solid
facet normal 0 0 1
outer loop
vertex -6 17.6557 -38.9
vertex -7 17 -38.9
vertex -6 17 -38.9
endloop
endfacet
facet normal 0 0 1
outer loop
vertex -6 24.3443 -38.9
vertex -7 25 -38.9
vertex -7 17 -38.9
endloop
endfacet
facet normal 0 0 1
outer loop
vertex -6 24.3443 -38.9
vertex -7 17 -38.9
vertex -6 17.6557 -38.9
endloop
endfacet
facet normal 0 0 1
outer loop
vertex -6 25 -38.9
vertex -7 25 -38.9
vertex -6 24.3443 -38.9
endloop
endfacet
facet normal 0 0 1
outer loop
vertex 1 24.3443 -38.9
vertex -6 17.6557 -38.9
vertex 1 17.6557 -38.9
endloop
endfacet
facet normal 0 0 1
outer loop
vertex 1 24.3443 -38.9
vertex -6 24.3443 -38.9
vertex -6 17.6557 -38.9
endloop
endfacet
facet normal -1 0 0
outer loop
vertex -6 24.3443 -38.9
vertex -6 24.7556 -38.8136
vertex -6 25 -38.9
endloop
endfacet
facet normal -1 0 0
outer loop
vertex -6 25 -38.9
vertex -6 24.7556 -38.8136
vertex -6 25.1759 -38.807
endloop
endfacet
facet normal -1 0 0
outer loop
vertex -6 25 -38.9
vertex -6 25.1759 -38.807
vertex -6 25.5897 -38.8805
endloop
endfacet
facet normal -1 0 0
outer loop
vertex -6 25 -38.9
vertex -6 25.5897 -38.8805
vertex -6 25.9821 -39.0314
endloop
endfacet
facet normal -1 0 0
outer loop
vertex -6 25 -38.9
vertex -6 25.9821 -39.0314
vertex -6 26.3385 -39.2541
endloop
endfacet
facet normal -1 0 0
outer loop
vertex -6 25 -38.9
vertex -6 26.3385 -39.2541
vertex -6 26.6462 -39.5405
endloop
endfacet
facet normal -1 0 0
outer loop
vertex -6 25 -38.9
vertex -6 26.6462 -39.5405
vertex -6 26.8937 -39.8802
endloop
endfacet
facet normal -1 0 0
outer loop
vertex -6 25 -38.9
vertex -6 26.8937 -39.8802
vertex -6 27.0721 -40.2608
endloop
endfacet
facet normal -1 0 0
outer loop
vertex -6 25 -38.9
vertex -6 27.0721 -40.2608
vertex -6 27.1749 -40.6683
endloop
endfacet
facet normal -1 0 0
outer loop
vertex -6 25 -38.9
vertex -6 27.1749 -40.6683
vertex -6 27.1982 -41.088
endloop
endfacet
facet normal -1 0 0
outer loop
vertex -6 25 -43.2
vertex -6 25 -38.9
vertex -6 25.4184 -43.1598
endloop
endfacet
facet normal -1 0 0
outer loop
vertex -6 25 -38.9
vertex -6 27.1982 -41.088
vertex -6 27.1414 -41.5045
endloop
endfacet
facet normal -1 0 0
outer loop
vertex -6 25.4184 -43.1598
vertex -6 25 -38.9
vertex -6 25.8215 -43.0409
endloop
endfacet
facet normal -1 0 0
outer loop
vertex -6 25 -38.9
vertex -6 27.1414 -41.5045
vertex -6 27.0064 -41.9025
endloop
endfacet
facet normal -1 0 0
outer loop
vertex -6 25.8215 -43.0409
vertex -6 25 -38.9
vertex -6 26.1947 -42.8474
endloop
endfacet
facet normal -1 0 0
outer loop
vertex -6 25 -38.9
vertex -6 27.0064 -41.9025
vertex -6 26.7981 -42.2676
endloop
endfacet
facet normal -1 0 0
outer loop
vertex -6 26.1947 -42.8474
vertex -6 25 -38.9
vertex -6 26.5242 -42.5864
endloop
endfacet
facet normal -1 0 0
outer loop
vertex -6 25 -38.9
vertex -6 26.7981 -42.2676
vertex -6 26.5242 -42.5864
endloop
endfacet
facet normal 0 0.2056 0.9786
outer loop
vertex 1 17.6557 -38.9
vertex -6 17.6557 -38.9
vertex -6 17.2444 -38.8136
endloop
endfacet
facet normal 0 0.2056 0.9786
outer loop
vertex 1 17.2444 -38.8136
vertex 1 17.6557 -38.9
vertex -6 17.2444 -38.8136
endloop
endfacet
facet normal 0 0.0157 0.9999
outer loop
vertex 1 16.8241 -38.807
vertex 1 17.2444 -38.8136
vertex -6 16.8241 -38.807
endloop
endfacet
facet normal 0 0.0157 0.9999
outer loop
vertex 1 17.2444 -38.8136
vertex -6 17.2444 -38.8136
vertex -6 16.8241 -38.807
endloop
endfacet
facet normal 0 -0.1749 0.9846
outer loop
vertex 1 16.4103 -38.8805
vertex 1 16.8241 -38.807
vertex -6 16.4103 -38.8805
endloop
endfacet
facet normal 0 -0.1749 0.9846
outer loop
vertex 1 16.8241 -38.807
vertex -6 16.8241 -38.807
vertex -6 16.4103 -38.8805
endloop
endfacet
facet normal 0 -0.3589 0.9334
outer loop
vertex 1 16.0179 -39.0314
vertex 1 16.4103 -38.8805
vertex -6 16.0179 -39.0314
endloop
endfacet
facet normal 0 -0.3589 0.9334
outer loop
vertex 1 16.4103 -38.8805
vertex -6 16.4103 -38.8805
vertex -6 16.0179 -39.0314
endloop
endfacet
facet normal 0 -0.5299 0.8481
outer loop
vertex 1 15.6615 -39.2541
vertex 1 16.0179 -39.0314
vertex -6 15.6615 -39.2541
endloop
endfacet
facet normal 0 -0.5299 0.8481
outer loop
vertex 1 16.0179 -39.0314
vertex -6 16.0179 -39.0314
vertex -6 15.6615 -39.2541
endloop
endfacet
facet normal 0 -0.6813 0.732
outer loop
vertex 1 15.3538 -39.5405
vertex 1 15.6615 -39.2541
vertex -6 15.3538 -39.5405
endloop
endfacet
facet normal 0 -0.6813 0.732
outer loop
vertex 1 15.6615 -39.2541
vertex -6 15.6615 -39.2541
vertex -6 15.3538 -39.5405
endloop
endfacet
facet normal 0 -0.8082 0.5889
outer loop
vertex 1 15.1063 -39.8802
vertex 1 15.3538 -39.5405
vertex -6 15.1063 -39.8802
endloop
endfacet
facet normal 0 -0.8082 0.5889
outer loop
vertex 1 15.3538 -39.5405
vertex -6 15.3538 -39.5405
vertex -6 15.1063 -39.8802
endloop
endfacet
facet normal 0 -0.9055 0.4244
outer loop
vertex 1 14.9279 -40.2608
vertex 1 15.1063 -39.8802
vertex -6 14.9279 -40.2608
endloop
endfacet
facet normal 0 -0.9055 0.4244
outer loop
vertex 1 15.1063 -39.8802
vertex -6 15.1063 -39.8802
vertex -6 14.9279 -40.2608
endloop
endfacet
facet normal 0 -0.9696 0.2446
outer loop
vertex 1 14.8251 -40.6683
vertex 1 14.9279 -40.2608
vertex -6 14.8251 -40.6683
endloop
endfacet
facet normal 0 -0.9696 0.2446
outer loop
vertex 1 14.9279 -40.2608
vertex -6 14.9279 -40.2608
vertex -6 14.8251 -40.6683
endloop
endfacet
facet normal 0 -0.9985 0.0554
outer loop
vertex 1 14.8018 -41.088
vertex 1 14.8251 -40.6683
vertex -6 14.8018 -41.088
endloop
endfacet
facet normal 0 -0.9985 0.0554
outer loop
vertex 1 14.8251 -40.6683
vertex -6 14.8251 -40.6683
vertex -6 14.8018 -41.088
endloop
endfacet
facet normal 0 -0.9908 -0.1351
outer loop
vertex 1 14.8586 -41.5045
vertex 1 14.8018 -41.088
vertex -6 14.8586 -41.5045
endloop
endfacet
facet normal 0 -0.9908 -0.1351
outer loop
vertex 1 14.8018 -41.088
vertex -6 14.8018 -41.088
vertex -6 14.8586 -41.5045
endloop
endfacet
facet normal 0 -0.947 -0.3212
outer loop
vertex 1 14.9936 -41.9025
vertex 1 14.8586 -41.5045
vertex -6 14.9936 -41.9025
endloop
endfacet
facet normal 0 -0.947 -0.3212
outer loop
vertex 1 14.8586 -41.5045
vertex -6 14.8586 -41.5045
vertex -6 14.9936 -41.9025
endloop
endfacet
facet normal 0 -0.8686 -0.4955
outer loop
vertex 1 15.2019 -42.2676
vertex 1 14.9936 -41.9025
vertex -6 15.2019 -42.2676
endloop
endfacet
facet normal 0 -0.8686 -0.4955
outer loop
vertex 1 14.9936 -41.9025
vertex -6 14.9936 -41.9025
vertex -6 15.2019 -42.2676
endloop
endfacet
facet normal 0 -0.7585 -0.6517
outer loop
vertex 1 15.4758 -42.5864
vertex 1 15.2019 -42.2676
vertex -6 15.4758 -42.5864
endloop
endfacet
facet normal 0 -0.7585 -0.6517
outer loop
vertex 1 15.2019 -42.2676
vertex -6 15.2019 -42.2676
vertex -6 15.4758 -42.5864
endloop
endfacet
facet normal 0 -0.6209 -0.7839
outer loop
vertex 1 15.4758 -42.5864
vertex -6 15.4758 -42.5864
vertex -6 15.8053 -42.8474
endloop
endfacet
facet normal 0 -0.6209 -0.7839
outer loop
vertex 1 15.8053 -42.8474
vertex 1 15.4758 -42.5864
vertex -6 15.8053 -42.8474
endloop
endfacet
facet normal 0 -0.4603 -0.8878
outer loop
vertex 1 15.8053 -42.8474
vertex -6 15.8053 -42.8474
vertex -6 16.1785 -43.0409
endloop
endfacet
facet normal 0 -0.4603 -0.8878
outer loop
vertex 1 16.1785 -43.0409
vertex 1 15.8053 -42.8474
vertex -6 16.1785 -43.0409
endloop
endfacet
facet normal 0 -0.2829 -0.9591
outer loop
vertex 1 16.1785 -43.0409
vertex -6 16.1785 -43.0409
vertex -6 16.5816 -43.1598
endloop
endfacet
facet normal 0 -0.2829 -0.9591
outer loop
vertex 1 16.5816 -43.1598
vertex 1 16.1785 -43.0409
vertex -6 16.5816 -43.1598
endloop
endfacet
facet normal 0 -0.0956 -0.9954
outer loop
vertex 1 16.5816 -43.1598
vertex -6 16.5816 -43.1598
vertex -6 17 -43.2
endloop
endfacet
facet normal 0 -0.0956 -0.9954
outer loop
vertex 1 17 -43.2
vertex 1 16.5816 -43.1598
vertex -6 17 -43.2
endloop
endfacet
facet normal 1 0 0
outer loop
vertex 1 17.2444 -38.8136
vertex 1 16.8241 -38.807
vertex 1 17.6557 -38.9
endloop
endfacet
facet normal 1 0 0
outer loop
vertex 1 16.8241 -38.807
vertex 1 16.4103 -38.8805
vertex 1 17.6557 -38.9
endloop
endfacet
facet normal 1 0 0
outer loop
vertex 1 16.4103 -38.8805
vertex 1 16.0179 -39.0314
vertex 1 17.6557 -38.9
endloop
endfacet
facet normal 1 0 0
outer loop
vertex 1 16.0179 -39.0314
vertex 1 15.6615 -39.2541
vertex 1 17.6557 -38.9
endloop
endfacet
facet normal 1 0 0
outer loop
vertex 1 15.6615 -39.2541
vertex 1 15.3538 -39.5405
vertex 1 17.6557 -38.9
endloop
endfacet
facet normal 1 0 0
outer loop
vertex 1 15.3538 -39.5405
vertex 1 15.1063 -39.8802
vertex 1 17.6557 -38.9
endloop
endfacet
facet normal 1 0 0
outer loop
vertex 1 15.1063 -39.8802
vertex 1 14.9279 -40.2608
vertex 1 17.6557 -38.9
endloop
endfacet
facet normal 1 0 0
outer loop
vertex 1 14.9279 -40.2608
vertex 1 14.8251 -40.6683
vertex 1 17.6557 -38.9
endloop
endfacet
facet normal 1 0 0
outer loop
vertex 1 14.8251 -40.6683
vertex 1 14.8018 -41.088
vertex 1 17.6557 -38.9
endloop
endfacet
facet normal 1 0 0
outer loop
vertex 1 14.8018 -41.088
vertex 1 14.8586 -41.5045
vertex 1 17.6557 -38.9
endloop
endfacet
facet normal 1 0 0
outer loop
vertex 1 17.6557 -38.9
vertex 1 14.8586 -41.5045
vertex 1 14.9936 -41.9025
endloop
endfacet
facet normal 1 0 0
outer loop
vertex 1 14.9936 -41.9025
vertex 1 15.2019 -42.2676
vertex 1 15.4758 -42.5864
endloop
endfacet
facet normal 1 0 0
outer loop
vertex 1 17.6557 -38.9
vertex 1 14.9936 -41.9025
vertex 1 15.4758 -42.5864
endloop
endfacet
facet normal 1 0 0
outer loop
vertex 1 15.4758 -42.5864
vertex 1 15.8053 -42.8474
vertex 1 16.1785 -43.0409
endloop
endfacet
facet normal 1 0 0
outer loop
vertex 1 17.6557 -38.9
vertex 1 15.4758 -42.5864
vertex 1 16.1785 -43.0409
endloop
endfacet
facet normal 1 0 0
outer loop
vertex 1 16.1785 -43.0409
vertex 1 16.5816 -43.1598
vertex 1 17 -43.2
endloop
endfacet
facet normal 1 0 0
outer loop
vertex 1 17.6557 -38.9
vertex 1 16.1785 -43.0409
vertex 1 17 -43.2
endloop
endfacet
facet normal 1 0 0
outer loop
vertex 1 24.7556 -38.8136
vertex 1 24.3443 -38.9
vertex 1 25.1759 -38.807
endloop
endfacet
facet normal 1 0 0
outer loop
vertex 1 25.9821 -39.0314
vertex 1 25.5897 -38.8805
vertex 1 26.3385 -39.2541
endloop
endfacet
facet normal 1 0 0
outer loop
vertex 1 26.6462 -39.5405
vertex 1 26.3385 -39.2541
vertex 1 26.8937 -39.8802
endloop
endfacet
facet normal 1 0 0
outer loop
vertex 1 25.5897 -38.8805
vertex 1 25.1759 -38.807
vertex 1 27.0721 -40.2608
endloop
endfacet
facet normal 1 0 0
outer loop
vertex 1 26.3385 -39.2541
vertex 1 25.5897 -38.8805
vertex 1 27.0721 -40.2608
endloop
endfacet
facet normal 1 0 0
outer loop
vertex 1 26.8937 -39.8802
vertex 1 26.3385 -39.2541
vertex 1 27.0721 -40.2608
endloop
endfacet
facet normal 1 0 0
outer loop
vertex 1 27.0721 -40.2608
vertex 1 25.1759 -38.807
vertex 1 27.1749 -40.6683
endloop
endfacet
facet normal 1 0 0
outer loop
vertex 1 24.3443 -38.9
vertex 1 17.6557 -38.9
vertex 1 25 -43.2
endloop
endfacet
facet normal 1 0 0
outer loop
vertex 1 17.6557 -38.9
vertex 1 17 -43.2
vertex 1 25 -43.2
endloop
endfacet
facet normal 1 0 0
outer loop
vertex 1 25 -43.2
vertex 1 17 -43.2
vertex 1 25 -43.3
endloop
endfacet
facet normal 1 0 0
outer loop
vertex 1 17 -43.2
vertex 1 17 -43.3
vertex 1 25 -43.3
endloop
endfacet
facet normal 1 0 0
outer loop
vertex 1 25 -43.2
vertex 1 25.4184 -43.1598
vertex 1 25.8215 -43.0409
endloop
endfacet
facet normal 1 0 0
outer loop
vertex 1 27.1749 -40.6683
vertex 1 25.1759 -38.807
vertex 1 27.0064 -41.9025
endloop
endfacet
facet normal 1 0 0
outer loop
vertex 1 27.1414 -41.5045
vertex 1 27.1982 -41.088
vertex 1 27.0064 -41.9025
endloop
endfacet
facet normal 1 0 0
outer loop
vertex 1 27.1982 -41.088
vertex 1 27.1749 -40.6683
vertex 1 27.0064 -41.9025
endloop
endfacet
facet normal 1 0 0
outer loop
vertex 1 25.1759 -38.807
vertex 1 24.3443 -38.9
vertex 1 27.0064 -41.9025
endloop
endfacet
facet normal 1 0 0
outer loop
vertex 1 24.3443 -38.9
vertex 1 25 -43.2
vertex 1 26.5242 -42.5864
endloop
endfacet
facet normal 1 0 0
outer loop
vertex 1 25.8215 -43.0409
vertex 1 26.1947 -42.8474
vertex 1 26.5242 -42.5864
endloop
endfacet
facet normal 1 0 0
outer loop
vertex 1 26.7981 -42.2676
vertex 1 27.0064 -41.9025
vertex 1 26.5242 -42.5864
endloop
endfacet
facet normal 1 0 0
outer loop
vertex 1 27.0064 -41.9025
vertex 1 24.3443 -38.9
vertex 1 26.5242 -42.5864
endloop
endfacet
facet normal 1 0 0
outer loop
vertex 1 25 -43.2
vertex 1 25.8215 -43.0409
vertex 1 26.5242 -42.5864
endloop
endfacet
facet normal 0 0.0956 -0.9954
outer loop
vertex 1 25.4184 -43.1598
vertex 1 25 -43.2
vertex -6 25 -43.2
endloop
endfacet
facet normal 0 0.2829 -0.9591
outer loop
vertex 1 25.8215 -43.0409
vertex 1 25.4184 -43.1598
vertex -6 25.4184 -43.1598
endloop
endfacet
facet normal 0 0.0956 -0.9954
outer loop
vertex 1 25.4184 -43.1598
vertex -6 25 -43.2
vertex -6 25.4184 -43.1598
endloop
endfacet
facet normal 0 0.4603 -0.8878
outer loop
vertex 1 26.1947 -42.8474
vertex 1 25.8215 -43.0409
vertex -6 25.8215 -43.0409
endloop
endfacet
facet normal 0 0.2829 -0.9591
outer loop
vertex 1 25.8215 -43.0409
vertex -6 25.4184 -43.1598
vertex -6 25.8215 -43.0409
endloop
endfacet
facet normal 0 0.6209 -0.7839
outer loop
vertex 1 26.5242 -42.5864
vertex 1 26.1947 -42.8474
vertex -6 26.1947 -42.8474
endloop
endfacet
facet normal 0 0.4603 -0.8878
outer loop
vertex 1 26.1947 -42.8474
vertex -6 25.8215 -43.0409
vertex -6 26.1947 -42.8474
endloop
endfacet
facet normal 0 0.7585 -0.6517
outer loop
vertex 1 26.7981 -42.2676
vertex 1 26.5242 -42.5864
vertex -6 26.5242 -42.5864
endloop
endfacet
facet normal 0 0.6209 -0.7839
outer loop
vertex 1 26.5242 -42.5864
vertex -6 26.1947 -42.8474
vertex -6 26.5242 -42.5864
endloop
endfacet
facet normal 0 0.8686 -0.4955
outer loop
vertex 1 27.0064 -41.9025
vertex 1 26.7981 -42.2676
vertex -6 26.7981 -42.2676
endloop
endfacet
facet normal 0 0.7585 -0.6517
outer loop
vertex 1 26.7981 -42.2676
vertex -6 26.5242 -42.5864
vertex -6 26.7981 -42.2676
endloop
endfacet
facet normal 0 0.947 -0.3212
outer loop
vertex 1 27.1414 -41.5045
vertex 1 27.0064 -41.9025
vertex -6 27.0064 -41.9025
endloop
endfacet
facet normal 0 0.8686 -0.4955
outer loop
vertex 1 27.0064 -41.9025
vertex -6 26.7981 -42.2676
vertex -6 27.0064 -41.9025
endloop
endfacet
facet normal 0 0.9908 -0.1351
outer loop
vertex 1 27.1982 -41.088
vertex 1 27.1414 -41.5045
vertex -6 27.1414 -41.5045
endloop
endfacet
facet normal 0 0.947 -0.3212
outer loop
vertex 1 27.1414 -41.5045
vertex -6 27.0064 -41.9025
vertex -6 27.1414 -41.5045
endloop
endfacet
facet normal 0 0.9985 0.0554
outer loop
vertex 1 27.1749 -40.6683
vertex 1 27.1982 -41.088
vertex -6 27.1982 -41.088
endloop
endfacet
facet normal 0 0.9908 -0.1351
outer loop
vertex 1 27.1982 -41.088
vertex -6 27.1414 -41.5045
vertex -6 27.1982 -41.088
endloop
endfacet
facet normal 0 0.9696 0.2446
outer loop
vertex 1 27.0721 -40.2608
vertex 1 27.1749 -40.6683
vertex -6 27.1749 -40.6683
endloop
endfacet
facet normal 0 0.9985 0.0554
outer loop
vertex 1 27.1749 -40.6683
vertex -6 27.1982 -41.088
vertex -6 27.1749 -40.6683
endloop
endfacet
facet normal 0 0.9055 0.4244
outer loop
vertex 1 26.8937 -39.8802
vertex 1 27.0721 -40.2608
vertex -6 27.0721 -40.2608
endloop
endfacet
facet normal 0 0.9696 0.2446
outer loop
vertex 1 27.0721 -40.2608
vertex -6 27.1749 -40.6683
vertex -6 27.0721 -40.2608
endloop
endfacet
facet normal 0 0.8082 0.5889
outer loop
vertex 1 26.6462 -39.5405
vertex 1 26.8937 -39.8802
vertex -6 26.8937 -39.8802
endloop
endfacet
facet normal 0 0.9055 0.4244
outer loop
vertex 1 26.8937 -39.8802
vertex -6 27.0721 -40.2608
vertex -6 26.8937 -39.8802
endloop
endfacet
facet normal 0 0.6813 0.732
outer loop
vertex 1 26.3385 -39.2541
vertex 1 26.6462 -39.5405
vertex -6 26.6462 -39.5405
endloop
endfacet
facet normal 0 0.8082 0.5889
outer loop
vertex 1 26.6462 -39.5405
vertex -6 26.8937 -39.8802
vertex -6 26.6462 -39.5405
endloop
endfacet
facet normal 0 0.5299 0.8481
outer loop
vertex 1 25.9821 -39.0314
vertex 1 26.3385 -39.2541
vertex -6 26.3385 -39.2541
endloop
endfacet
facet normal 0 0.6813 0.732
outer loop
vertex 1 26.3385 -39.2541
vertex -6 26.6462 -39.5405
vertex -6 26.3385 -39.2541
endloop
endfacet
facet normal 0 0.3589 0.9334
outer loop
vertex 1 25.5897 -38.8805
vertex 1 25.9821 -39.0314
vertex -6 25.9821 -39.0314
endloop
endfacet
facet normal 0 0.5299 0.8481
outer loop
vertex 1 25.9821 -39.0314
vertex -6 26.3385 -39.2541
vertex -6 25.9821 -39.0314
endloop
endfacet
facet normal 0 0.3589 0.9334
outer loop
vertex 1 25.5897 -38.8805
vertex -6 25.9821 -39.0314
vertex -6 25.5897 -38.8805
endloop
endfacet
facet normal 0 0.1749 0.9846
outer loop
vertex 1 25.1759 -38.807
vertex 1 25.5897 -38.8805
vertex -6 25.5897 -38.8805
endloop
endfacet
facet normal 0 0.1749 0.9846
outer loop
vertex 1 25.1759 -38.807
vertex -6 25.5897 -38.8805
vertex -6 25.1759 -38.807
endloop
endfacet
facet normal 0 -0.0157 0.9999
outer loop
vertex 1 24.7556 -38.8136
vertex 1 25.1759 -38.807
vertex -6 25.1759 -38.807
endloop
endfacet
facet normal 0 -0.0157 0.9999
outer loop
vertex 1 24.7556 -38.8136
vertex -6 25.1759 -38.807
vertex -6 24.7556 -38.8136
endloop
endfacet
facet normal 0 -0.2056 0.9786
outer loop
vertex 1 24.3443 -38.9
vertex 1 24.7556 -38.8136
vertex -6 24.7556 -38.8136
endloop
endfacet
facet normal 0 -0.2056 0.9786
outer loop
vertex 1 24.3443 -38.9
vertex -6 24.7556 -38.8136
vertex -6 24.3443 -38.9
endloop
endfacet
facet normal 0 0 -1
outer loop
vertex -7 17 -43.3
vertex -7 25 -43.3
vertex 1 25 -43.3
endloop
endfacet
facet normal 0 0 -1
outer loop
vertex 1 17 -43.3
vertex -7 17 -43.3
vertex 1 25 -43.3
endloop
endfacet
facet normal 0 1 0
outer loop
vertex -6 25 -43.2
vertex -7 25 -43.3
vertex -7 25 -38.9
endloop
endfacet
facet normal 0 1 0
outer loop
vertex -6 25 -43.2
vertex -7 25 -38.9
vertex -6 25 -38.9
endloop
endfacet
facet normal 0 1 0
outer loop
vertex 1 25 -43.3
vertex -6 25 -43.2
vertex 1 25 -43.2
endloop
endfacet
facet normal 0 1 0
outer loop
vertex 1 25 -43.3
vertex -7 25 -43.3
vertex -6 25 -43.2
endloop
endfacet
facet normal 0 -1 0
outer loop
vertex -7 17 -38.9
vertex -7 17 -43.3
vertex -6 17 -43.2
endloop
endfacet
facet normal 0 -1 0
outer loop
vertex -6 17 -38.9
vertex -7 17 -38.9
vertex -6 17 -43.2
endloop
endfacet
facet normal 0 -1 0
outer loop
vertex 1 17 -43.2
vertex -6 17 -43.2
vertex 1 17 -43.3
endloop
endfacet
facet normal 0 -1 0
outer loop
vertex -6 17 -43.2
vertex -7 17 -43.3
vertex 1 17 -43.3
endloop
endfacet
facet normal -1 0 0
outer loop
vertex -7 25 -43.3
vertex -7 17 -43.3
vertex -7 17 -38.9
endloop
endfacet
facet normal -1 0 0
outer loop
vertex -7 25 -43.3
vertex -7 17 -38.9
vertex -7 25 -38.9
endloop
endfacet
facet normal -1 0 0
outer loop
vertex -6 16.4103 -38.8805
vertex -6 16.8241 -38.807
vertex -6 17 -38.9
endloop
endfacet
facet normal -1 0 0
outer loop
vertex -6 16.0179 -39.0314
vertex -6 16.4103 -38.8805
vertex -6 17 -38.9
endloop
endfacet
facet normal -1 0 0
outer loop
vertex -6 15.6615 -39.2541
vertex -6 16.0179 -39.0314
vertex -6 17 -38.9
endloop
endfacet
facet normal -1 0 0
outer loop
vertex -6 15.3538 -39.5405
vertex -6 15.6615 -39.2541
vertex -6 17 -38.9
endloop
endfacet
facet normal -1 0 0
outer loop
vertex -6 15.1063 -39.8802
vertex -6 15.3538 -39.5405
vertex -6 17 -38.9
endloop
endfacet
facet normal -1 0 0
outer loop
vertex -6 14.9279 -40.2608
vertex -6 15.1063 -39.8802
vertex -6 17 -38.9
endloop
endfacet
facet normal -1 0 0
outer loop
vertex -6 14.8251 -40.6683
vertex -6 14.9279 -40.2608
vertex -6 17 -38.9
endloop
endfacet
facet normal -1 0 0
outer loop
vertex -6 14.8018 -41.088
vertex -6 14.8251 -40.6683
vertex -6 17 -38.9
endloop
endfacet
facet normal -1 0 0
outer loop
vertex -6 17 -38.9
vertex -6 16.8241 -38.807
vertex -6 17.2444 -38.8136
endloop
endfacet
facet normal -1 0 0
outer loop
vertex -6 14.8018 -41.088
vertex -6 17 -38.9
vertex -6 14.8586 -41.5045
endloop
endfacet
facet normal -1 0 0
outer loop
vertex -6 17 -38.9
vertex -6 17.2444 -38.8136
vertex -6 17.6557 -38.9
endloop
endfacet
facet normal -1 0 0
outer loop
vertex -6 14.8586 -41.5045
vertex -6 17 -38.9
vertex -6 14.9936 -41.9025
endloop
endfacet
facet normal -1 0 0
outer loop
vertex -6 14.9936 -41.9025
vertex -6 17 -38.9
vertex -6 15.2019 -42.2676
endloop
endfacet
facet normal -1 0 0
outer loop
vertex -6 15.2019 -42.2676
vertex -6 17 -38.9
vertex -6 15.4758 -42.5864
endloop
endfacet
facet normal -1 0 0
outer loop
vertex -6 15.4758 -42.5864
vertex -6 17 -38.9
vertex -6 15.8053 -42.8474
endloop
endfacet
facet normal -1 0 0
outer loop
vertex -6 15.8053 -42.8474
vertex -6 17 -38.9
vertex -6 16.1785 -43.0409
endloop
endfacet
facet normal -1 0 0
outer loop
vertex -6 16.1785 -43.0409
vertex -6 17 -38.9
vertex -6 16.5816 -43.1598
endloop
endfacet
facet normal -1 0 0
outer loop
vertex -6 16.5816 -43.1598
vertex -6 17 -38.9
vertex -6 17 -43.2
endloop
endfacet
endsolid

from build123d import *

# Parameters (mm, degrees)
CYLINDER_R              = 2.2
CYLINDER_DEPTH          = 7
CYLINDER_PITCH_ANGLE    = 90
BOX_W                   = 8
BOX_H                   = 8
BOX_DEPTH               = 4.4
CYLINDER001_R           = 2.2
CYLINDER001_DEPTH       = 7
CYLINDER001_PITCH_ANGLE = 90


with BuildPart() as v_lec:
    # Cylinder → Cylinder (new body)
    with BuildSketch(Plane.XY):
        Circle(CYLINDER_R)
    extrude(amount=CYLINDER_DEPTH)


with BuildPart() as v_lec_1:
    # Cylinder pitch: moved
    add(v_lec.part.rotate(Axis((0, 0, 0), (0, 1, 0)), CYLINDER_PITCH_ANGLE))


with BuildPart() as v_lec_2:
    # Cylinder placement: moved
    add(v_lec_1.part.moved(Location((-6, 25, -41))))


with BuildPart() as krychle:
    # Box → Box (new body)
    with BuildSketch(Plane(origin=(-7, 17, -43.3), x_dir=(1, 0, 0), z_dir=(0, 0, 1))):
        with Locations((4, 4)):
            Rectangle(BOX_W, BOX_H)
    extrude(amount=BOX_DEPTH)


with BuildPart() as fusion001003:
    # Cylinder001 → Cylinder001 (new body)
    with BuildSketch(Plane.XY):
        Circle(CYLINDER001_R)
    extrude(amount=CYLINDER001_DEPTH)


with BuildPart() as fusion001003_1:
    # Cylinder001 pitch: moved
    add(fusion001003.part.rotate(Axis((0, 0, 0), (0, 1, 0)), CYLINDER001_PITCH_ANGLE))


with BuildPart() as fusion001003_2:
    # Cylinder001 placement: moved
    add(fusion001003_1.part.moved(Location((-6, 17, -41))))

    # Fusion001003: union Válec, Krychle
    add(v_lec_2.part)
    add(krychle.part)


solid = fusion001003_2.part
